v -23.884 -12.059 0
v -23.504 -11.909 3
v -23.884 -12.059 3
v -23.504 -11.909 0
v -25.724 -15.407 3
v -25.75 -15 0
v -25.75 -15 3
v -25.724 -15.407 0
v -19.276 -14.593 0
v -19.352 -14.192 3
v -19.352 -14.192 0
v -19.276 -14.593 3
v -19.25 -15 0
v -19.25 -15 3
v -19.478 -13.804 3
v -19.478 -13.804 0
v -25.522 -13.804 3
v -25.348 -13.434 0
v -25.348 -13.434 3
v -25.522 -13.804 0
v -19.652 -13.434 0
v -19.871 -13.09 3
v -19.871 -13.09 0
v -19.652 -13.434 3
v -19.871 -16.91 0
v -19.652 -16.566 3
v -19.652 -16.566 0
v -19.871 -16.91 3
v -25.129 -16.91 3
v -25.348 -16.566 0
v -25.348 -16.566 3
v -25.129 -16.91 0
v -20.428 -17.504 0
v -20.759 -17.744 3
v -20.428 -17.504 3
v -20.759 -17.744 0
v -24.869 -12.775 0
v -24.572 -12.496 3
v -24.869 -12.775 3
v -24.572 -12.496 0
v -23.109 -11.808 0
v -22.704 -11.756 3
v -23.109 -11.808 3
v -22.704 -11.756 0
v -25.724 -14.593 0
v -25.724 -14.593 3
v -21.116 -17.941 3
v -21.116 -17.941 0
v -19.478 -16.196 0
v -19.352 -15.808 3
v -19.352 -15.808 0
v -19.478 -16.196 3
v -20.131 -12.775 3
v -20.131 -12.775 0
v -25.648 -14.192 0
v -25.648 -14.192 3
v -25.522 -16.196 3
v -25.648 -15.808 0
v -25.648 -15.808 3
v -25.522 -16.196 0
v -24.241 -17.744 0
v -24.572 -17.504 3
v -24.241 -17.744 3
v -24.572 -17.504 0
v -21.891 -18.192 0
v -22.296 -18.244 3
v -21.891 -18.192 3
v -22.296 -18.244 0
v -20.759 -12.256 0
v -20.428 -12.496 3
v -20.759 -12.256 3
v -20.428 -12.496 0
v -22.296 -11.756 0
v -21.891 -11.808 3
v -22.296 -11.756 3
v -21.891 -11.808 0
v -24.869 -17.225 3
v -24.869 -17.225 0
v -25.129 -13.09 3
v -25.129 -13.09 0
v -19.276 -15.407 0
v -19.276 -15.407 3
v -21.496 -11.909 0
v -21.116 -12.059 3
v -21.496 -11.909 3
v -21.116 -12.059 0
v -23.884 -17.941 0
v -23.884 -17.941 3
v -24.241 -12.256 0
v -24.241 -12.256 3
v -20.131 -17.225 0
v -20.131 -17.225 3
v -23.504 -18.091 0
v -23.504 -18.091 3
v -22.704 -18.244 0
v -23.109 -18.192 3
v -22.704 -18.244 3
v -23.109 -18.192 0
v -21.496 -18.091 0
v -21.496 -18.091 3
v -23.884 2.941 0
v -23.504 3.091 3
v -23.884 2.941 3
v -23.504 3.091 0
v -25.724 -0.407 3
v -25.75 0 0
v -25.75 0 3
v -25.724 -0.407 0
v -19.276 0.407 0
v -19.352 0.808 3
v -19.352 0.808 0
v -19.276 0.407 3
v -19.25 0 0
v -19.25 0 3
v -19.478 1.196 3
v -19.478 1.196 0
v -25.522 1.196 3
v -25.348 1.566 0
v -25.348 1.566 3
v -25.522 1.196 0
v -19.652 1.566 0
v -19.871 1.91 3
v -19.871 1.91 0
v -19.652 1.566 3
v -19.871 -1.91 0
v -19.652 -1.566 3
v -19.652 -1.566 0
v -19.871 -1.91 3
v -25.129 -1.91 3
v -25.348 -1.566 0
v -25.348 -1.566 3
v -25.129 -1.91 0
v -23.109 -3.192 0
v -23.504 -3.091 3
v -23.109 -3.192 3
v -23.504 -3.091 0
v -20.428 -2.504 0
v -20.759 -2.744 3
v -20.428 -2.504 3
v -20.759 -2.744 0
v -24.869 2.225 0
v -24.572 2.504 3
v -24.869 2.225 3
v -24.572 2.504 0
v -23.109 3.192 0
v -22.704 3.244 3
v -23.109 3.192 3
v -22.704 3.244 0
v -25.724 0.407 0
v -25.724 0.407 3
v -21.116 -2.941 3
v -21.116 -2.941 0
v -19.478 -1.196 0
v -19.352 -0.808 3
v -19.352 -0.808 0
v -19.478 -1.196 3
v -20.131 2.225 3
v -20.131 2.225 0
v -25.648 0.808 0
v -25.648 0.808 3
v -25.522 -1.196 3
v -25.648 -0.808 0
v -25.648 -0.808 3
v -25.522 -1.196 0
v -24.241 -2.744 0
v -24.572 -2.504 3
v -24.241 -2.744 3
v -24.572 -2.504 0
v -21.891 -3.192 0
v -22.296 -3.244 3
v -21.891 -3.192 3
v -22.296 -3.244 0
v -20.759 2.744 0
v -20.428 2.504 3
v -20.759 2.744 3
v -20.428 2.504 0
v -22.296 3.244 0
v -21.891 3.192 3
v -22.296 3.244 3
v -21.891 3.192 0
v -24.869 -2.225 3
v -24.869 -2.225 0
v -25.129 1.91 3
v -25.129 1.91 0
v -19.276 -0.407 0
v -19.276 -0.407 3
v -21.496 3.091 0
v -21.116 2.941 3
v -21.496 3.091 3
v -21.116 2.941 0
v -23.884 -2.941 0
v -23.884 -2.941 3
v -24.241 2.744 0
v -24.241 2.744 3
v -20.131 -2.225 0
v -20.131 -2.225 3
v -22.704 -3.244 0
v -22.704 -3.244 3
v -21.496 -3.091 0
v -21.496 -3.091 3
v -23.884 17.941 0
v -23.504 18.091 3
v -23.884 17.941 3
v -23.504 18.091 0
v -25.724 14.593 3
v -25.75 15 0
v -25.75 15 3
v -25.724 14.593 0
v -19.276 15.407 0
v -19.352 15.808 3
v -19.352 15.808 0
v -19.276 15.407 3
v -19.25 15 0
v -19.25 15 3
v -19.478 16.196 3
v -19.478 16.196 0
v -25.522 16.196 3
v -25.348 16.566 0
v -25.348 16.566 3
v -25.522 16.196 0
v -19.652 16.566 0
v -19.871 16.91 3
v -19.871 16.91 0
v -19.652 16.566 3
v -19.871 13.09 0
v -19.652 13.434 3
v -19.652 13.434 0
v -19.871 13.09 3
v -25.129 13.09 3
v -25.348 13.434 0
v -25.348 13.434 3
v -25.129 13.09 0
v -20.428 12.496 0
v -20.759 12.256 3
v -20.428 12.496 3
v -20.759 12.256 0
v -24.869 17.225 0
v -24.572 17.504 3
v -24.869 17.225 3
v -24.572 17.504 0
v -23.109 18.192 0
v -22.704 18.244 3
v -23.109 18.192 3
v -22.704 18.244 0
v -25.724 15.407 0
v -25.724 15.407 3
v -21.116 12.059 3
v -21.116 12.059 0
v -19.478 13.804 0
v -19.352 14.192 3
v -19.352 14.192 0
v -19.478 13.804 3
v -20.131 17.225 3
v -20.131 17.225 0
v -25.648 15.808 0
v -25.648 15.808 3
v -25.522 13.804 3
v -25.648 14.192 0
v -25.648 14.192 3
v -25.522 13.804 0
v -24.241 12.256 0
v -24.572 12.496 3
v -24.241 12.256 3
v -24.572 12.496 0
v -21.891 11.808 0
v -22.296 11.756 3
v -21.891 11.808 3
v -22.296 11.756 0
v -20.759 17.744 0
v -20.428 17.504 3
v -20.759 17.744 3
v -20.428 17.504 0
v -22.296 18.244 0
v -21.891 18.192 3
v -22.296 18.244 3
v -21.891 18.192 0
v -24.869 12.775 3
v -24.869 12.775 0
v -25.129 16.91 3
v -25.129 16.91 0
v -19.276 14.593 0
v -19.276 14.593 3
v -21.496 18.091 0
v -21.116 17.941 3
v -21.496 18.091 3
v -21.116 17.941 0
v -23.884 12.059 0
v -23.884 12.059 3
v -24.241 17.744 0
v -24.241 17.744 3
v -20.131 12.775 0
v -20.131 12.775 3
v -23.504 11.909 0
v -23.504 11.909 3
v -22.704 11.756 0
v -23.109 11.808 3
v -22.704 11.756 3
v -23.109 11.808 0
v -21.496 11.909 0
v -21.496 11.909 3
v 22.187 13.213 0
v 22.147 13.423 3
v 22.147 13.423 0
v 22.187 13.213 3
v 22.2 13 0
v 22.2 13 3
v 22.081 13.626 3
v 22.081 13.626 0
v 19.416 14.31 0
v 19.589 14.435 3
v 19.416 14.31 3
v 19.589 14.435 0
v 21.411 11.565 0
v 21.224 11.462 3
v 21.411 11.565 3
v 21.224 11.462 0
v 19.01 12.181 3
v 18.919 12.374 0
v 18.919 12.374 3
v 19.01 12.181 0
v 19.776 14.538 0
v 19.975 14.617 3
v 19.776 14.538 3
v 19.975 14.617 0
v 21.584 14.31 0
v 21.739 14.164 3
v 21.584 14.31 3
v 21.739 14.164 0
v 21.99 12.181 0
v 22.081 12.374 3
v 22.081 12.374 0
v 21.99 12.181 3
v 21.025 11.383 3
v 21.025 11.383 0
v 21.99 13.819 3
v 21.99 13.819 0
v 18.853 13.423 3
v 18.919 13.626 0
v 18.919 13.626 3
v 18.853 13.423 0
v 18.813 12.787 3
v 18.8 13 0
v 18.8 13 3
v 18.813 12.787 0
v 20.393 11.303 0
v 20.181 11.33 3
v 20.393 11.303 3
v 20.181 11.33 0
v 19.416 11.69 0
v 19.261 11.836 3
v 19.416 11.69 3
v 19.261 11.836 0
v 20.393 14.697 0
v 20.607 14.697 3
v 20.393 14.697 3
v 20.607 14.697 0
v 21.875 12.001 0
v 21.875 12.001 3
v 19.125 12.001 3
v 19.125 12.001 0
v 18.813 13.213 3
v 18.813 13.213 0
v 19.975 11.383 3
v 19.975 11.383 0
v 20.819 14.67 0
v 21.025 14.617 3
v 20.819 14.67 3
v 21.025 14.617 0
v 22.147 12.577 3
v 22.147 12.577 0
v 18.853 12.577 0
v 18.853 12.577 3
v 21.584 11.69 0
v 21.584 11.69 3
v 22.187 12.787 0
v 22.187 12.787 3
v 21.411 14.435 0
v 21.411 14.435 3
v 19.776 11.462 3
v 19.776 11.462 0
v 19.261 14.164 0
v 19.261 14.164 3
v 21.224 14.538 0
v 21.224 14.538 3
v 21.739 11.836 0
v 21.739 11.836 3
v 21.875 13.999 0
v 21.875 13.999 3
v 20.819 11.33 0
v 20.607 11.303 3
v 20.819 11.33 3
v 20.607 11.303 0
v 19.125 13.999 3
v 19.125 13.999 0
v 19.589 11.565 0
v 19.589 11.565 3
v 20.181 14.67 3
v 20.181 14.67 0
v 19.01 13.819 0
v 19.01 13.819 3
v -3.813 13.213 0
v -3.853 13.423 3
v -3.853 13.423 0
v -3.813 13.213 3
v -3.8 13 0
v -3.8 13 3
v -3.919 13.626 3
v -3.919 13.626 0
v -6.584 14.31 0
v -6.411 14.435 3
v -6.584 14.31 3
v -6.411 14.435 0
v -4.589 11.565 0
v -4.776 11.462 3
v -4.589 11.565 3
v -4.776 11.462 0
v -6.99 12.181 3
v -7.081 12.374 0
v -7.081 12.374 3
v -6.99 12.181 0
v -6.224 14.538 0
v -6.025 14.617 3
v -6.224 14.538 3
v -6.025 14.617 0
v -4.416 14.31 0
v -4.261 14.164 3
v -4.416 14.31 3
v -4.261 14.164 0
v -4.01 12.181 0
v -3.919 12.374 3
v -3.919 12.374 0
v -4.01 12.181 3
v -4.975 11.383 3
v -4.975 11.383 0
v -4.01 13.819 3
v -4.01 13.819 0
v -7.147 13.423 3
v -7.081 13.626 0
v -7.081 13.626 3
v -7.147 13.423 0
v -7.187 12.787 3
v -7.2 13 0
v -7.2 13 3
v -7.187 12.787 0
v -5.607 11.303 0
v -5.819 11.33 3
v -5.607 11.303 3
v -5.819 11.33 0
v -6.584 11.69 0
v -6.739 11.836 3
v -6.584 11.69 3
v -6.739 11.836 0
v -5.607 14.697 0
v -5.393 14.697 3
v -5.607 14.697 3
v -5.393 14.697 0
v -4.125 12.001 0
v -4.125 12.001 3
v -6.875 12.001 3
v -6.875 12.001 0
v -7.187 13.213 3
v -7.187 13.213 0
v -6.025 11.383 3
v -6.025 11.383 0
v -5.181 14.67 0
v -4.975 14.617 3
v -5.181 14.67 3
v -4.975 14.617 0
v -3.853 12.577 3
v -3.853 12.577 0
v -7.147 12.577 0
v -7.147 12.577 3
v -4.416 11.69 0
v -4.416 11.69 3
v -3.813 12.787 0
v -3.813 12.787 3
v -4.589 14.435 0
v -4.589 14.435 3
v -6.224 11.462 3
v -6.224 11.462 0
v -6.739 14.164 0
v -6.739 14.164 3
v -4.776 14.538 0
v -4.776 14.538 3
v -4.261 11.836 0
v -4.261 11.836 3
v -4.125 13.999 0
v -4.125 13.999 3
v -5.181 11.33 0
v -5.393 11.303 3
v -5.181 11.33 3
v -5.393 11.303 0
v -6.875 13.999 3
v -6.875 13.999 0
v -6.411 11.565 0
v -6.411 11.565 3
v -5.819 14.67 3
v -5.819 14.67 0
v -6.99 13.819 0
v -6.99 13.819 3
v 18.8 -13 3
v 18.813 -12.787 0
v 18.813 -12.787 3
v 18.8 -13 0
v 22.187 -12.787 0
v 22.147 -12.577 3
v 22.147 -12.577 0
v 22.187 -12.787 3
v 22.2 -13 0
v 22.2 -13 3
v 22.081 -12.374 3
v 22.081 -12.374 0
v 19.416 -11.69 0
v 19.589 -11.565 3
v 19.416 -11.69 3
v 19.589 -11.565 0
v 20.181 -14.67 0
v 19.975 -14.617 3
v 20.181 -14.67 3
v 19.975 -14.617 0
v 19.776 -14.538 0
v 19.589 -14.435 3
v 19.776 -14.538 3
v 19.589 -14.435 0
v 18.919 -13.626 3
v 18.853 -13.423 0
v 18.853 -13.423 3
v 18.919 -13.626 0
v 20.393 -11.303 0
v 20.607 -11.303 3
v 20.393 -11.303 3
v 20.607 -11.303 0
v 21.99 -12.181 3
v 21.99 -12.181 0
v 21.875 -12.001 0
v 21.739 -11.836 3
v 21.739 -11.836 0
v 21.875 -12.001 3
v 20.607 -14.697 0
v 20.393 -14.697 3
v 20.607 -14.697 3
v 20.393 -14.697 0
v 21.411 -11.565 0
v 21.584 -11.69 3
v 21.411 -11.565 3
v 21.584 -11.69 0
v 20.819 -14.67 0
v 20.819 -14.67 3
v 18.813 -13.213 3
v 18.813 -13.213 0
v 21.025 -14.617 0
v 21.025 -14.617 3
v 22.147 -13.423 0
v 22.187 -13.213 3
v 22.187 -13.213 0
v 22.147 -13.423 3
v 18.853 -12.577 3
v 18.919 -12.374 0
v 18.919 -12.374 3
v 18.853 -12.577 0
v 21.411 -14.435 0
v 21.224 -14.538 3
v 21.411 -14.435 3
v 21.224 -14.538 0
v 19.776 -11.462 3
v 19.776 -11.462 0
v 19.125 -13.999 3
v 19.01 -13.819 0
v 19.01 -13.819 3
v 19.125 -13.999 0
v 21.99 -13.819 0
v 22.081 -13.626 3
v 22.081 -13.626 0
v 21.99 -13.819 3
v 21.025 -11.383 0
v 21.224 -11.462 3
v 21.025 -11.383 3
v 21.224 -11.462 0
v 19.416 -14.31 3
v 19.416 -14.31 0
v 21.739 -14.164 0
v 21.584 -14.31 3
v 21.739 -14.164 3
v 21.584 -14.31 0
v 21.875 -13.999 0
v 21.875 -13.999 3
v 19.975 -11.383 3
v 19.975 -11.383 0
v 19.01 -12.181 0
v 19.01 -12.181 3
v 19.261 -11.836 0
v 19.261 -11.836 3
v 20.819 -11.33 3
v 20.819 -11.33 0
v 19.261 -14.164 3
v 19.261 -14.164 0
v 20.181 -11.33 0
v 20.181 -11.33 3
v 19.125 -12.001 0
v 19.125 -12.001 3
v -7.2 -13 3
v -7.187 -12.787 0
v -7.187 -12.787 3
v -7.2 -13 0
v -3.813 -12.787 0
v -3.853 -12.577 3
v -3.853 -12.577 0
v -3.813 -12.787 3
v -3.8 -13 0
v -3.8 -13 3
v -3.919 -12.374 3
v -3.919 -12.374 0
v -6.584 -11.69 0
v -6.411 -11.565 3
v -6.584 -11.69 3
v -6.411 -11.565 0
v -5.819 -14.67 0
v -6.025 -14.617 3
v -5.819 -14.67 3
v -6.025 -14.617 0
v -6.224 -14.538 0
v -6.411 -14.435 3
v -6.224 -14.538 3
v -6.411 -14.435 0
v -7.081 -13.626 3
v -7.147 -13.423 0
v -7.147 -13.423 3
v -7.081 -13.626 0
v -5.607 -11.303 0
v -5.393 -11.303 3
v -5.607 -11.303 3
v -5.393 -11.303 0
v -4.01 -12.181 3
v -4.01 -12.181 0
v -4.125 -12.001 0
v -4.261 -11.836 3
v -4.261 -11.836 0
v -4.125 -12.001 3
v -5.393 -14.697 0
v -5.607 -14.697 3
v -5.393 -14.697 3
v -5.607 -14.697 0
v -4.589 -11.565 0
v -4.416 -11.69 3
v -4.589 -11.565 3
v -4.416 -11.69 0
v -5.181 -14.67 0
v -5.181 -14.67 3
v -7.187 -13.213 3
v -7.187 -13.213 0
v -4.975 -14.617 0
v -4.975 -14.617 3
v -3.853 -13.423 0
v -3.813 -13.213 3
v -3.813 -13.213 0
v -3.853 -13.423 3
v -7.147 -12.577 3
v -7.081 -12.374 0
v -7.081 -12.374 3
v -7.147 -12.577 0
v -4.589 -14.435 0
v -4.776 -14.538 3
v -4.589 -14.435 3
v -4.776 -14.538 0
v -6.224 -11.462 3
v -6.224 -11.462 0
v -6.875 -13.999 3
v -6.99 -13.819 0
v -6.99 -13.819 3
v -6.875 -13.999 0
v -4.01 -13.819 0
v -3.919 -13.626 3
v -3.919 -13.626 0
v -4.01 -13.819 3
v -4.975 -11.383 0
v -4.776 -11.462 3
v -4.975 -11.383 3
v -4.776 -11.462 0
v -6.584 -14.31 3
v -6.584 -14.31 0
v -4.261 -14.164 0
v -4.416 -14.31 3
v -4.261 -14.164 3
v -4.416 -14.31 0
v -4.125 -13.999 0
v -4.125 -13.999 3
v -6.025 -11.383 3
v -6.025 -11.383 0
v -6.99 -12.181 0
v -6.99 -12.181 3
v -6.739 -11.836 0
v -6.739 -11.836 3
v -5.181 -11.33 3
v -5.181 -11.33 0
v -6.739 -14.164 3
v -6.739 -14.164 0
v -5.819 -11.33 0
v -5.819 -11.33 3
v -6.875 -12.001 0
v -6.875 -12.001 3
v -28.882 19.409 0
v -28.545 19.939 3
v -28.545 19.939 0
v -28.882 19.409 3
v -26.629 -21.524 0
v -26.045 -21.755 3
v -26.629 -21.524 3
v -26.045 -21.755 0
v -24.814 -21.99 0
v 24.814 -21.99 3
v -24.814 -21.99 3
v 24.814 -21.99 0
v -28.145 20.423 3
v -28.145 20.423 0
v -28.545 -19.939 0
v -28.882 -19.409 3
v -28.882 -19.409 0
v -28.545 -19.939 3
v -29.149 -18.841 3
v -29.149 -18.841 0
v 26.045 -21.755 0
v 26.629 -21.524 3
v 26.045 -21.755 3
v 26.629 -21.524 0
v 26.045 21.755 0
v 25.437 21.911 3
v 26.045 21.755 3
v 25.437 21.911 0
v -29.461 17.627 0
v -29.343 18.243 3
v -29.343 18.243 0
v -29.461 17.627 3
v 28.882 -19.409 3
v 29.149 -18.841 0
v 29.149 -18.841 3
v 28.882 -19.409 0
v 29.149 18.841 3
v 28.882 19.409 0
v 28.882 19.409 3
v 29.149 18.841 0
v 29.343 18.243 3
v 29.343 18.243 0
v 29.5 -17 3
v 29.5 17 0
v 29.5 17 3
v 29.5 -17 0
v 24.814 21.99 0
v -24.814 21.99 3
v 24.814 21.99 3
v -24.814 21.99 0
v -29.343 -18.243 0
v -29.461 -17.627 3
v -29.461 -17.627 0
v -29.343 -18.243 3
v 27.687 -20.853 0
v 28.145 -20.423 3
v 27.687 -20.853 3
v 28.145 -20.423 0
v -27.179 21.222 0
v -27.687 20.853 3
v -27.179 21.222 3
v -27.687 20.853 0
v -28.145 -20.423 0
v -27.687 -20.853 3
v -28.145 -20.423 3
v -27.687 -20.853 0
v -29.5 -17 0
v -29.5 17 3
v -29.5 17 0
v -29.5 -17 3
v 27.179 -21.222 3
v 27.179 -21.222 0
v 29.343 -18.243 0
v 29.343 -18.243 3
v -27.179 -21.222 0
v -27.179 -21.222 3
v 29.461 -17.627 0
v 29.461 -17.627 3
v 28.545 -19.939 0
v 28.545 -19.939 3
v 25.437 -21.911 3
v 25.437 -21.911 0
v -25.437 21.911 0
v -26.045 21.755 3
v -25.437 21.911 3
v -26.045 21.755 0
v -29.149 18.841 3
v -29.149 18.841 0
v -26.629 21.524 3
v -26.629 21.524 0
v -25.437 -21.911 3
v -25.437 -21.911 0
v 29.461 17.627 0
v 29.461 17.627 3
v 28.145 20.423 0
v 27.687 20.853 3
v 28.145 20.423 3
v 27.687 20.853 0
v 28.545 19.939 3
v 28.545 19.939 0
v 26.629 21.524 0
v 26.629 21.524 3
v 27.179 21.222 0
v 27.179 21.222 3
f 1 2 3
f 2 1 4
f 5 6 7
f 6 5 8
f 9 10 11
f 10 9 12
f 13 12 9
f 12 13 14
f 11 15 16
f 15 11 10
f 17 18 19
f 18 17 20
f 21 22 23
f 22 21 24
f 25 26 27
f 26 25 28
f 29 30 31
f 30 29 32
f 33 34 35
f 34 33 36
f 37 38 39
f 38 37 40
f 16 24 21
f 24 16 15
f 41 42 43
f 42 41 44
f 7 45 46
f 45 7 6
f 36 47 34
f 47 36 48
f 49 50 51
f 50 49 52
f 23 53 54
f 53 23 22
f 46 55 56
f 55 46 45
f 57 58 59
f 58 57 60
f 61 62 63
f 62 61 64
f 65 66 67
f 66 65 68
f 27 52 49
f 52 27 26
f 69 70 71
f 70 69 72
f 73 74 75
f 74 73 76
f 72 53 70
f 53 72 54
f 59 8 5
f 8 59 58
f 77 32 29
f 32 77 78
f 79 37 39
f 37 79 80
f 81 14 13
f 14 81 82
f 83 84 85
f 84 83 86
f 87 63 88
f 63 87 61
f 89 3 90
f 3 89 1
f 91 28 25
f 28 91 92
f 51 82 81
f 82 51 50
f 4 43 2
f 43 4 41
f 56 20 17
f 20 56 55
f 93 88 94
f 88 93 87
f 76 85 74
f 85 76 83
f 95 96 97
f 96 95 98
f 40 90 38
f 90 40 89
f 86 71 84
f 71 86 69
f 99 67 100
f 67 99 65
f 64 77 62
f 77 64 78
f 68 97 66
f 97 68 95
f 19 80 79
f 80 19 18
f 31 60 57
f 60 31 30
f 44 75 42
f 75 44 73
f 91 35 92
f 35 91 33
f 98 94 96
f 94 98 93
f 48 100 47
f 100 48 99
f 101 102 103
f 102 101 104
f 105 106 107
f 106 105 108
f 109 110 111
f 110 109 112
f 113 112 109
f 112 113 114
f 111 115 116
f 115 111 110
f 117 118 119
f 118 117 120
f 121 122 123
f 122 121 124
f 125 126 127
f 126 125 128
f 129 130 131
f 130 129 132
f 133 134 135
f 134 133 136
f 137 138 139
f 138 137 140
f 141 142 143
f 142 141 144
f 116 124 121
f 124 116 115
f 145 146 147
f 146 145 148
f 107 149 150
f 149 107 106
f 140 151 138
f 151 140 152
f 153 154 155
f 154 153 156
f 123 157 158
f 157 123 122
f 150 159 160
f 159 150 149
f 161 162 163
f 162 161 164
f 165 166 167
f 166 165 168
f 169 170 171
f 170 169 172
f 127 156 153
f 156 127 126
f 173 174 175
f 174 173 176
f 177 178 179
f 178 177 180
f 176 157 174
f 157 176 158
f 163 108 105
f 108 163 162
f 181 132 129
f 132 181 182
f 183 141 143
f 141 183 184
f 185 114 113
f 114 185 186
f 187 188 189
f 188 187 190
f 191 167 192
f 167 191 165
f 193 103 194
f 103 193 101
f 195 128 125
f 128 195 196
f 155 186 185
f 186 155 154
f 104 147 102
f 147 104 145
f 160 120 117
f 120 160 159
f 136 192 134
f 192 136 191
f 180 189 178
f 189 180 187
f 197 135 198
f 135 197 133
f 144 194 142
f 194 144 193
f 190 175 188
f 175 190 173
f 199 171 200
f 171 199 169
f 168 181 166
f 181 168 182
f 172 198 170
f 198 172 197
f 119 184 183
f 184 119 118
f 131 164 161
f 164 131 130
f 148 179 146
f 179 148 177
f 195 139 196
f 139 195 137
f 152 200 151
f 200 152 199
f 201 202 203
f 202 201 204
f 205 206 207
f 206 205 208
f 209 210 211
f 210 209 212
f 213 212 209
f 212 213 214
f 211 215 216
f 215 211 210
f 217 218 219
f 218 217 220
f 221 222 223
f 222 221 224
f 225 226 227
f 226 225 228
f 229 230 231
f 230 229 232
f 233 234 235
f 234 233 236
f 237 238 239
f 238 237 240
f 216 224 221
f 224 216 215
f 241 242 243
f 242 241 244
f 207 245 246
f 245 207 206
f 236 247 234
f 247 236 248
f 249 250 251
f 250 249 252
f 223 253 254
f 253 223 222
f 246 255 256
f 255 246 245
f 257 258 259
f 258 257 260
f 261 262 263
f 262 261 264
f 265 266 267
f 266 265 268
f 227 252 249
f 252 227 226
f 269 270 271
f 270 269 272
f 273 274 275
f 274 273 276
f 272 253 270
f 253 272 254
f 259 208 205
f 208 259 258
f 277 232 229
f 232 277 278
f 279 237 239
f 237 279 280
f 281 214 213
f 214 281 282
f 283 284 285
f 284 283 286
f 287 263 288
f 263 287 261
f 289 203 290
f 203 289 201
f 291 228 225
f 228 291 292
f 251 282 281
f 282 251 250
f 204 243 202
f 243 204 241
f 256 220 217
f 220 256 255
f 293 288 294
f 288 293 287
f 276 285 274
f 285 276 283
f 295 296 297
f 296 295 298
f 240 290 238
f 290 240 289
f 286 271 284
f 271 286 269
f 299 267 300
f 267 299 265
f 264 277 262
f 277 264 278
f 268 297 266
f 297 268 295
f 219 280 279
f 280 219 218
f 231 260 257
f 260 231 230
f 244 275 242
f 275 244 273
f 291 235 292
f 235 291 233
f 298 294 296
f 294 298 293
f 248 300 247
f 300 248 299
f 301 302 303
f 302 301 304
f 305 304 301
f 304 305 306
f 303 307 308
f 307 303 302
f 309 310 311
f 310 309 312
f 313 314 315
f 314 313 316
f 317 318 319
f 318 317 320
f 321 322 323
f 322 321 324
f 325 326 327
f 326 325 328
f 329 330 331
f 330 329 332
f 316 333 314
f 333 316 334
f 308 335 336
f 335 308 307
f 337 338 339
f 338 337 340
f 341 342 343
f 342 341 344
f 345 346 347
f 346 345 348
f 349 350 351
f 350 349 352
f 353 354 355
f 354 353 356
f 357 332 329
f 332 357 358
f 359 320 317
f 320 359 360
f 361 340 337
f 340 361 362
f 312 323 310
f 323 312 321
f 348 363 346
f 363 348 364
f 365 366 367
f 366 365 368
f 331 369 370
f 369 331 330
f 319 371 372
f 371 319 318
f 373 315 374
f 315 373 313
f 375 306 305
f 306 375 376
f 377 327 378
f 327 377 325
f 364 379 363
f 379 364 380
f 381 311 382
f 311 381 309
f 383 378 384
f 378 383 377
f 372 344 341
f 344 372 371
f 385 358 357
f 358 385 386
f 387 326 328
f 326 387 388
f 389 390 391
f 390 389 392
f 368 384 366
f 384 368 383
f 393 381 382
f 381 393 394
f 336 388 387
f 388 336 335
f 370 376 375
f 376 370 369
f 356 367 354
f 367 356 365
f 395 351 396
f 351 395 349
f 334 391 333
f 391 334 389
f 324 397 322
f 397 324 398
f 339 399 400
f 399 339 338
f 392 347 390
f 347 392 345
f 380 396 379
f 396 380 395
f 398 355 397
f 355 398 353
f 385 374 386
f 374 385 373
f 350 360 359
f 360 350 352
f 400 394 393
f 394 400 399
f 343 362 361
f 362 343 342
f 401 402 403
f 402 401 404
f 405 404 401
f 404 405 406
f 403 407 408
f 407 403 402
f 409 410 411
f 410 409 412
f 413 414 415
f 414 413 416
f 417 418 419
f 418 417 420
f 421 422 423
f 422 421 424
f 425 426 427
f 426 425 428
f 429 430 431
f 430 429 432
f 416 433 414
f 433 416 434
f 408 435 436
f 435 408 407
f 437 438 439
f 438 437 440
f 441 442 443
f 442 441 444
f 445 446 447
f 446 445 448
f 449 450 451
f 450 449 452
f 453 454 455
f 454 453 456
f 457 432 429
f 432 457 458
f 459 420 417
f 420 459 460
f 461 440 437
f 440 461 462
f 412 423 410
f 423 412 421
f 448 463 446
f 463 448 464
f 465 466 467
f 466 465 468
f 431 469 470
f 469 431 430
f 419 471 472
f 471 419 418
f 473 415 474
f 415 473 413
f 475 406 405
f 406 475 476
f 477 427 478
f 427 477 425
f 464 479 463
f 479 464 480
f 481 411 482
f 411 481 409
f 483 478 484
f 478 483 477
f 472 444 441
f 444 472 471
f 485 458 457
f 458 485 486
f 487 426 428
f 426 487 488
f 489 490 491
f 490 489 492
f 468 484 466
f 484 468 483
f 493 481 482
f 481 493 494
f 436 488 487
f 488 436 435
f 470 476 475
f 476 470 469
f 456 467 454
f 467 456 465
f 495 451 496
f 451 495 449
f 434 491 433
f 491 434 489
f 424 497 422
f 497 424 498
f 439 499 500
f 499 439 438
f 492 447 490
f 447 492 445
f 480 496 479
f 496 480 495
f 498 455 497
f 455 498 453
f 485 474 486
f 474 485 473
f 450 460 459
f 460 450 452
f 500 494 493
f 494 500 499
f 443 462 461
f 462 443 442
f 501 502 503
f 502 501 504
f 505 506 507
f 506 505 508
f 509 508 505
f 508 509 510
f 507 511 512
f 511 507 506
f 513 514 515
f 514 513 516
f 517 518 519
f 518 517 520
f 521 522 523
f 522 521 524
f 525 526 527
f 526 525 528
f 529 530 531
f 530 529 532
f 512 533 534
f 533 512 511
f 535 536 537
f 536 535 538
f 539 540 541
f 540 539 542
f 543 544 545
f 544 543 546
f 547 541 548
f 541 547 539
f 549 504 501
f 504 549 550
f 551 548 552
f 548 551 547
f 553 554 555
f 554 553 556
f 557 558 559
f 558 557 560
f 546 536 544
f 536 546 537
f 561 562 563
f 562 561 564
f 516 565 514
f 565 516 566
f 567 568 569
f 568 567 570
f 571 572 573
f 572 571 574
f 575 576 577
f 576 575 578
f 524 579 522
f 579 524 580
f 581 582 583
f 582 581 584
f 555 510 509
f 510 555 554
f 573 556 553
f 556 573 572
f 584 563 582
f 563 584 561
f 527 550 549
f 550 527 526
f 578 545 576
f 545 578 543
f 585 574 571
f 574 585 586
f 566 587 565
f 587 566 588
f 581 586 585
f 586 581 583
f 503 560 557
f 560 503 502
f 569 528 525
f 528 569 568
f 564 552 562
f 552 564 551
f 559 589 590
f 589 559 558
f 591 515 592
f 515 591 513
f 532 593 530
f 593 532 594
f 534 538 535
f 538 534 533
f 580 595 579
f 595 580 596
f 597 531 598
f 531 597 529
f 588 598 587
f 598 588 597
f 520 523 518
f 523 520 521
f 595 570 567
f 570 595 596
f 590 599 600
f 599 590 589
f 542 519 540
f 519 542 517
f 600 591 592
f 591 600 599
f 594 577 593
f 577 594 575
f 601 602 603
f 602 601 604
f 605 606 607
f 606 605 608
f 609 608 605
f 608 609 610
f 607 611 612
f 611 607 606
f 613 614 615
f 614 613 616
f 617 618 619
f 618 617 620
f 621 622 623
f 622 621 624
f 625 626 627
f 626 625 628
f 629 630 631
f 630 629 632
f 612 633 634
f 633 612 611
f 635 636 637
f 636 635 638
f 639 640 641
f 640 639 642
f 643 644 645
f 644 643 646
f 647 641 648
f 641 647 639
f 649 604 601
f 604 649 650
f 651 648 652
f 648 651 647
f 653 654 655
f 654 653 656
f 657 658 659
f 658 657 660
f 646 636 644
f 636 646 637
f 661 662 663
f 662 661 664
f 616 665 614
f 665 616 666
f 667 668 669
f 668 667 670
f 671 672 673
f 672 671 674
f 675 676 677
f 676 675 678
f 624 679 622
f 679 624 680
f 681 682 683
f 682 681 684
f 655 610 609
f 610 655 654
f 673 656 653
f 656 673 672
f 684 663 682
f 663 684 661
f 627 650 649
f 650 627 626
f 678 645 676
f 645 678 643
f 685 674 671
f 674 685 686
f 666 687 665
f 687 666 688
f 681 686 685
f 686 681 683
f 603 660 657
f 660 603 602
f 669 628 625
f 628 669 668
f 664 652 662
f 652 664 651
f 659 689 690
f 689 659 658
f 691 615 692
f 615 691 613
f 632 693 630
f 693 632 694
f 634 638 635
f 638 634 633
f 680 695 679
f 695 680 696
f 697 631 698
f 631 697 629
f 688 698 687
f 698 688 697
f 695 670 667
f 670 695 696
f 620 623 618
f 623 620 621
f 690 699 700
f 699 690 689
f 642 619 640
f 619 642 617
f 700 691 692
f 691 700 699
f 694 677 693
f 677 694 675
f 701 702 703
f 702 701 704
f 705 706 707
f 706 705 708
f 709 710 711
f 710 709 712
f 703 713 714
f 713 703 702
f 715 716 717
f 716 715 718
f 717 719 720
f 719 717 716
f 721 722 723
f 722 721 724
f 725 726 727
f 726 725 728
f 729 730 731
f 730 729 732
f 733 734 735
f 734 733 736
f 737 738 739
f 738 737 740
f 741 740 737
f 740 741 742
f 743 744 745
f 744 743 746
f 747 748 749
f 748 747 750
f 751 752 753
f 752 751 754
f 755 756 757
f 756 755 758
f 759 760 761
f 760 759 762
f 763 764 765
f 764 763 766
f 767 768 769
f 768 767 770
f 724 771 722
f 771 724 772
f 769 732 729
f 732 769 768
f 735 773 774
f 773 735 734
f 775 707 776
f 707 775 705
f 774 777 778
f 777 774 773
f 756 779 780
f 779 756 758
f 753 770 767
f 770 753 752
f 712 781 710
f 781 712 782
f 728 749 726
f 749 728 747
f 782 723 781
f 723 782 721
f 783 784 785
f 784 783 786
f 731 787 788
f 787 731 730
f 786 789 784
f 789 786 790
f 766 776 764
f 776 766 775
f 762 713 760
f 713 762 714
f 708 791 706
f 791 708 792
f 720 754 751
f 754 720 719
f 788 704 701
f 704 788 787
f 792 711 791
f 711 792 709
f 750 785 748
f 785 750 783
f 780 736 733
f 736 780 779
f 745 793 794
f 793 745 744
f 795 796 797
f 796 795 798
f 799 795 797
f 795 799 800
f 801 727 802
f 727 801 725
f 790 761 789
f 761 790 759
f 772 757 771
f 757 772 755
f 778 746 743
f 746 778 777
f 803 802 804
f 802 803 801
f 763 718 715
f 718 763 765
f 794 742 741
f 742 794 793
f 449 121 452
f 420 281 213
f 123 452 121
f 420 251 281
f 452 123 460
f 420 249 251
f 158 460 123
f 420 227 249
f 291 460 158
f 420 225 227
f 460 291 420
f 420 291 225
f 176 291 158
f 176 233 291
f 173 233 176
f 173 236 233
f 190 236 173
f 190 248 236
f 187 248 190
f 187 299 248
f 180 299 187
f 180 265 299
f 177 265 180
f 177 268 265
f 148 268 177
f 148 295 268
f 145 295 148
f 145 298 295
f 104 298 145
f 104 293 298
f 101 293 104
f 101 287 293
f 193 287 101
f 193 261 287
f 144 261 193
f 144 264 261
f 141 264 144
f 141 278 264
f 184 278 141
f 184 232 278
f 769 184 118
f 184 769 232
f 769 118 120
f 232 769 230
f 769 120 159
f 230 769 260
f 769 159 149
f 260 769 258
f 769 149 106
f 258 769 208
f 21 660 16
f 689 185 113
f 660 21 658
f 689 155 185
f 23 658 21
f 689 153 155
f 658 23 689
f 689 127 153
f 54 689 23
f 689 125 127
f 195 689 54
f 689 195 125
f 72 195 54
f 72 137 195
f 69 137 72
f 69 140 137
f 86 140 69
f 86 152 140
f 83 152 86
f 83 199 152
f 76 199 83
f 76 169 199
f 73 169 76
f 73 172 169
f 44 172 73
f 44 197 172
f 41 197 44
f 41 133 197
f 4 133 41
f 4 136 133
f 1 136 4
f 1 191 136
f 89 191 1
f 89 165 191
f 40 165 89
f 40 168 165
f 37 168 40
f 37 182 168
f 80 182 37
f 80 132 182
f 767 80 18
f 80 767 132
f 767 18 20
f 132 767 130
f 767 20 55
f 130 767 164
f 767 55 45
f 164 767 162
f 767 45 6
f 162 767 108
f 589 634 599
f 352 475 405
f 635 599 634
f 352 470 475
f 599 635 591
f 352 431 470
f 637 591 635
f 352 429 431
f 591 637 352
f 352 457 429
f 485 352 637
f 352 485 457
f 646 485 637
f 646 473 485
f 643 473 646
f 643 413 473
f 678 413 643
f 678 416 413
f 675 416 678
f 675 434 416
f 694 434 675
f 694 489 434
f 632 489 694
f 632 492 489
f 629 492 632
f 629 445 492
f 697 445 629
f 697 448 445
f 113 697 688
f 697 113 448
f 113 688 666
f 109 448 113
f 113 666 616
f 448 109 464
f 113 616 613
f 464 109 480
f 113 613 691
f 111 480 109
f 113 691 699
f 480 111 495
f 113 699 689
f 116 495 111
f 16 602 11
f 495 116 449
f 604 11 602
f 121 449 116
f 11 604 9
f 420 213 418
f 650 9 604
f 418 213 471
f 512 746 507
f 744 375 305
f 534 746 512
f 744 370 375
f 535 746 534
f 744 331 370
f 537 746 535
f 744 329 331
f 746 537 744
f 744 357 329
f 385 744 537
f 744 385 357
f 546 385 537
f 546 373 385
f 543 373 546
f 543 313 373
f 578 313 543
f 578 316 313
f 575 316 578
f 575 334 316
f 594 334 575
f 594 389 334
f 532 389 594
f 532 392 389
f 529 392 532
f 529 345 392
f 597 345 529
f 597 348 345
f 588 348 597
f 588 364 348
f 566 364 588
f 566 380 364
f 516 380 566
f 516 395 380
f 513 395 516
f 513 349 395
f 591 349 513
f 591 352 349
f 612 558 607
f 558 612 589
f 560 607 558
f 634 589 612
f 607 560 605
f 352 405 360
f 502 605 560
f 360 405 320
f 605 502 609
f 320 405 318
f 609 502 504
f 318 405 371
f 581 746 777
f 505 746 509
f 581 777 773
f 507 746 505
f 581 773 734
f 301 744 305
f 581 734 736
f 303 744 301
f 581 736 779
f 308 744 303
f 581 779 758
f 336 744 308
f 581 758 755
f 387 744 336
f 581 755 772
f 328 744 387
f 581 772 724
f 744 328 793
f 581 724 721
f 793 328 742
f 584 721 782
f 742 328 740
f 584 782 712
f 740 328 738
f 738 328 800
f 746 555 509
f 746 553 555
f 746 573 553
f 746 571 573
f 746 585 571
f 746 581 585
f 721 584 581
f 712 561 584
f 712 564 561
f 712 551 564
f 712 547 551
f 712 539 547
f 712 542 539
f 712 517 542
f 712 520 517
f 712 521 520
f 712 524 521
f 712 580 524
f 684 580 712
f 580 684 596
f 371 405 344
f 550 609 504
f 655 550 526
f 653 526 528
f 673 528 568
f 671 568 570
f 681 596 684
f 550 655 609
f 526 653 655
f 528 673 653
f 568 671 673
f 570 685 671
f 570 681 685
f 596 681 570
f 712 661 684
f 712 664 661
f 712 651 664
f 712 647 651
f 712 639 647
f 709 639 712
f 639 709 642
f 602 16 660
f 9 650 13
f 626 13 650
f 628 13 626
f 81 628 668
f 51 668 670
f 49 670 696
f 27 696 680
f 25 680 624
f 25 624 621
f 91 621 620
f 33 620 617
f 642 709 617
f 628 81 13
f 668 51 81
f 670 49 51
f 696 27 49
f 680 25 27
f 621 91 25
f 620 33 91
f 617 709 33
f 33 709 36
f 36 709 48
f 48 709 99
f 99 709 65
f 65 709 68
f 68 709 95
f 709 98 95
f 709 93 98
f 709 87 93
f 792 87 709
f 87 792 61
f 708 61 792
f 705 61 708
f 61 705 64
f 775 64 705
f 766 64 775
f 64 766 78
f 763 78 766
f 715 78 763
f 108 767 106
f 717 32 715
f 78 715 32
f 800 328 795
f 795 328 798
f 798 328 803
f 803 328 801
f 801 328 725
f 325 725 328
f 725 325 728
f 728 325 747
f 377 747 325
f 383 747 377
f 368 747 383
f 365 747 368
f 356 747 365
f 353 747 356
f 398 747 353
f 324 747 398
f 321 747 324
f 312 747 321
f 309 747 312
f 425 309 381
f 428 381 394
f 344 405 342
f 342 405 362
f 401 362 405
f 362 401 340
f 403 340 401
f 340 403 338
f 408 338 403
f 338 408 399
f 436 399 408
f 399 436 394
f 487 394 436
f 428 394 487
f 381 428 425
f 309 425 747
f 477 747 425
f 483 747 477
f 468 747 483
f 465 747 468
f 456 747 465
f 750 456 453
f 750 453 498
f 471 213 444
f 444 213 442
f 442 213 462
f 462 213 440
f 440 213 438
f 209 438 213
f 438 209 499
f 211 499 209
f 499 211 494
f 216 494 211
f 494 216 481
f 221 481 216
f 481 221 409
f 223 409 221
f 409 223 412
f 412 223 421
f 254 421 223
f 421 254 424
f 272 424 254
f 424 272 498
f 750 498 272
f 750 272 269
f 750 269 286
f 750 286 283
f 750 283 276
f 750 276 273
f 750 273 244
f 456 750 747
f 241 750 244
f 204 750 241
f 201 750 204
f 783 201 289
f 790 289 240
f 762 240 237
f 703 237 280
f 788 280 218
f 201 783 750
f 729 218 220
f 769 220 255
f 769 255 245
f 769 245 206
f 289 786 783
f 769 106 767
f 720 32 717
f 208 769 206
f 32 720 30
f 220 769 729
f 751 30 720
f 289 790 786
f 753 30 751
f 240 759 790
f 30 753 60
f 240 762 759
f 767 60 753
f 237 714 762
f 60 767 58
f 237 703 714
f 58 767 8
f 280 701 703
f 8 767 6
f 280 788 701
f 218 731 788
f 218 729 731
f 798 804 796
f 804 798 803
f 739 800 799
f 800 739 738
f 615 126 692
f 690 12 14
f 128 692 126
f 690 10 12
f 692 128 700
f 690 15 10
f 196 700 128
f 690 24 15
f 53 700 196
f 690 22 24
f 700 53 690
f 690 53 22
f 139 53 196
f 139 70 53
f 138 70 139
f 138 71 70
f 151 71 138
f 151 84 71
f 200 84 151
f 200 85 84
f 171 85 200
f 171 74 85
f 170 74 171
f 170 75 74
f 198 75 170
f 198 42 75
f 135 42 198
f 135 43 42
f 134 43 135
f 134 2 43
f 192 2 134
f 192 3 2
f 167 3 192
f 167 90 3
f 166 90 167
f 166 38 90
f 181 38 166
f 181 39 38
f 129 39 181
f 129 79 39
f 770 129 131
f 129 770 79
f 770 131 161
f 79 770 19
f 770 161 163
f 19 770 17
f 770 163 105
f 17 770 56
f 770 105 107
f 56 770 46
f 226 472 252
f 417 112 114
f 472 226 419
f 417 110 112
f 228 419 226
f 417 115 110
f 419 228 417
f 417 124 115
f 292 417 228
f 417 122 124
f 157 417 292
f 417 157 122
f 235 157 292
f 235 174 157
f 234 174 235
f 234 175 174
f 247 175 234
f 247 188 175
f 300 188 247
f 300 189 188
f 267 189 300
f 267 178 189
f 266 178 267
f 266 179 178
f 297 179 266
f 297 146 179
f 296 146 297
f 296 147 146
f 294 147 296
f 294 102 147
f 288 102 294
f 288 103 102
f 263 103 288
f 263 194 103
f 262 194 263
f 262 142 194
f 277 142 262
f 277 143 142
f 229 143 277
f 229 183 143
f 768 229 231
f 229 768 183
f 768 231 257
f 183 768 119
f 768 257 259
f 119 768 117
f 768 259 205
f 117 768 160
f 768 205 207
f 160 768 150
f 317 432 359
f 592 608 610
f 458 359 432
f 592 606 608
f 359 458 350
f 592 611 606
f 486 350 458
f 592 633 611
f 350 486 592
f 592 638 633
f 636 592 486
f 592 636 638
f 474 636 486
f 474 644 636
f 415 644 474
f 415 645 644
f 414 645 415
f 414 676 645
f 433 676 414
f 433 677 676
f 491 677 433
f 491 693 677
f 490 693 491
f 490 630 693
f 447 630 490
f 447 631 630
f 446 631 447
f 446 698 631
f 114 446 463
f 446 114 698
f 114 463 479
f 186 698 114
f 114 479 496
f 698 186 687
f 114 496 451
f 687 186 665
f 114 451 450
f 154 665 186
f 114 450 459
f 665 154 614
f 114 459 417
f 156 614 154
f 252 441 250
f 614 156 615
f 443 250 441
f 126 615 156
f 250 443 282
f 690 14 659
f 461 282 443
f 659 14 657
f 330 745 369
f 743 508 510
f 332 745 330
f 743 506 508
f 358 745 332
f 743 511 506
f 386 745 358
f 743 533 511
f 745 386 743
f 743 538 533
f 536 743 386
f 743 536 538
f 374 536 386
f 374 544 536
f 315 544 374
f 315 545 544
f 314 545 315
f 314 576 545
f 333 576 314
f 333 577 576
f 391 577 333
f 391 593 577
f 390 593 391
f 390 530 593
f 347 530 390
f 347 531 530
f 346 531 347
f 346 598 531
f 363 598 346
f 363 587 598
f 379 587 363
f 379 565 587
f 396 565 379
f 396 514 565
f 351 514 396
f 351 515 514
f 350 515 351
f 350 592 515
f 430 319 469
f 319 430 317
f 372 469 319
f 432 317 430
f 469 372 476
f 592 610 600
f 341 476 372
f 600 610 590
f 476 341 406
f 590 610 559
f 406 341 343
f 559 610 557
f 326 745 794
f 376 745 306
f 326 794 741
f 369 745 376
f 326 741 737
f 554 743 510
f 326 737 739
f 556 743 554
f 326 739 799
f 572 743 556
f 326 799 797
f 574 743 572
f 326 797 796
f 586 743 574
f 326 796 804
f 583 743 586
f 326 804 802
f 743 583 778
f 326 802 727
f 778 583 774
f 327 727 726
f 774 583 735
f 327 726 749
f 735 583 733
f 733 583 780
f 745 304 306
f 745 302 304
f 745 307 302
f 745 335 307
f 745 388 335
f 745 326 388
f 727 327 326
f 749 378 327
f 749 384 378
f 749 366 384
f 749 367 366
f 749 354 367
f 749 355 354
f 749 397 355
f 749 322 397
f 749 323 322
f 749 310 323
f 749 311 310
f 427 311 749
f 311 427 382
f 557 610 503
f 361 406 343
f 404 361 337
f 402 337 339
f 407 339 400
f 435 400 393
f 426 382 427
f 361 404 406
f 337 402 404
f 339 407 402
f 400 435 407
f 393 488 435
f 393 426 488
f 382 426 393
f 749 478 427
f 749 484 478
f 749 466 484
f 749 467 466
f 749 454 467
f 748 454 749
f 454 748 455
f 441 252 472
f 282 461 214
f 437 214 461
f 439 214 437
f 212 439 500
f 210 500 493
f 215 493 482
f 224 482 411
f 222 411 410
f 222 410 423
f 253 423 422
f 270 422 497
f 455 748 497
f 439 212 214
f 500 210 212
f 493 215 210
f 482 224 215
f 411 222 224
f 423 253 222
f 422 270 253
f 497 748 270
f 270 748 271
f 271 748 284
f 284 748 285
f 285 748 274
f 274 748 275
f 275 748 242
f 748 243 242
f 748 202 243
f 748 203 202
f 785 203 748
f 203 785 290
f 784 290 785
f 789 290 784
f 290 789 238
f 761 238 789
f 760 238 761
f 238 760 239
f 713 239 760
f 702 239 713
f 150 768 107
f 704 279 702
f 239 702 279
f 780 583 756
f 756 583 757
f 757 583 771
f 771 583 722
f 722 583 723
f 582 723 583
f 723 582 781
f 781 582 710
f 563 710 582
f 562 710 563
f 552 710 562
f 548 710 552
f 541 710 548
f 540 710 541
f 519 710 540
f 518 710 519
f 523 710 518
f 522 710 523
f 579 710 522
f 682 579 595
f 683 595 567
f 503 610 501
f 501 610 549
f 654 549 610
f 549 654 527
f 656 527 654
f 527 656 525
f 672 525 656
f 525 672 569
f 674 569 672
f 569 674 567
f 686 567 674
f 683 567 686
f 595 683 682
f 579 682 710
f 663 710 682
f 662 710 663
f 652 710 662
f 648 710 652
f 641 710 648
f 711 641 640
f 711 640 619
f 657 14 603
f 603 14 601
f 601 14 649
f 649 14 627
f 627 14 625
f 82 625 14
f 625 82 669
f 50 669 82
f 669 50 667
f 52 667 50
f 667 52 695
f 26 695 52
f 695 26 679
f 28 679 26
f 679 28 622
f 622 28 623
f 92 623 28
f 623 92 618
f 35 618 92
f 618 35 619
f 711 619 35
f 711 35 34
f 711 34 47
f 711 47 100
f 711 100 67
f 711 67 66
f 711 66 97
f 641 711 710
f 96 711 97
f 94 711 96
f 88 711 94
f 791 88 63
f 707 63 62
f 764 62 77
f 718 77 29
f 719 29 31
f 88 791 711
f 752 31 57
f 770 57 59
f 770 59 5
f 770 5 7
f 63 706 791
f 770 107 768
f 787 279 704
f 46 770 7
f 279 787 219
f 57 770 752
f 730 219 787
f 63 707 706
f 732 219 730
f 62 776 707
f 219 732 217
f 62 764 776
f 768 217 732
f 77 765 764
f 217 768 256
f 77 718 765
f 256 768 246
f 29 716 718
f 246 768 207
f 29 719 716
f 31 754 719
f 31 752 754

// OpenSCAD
$fn = 50;


difference() {
	union() {
		translate(v = [0, 0, 0]) {
			rotate(a = [0, 0, 0]) {
				hull() {
					translate(v = [-24.5000000000, 17.0000000000, 0]) {
						rotate(a = [0, 0, 0]) {
							translate(v = [0, 0, 0]) {
								rotate(a = [0, 0, 0]) {
									cylinder(h = 3, r = 5);
								}
							}
						}
					}
					translate(v = [24.5000000000, 17.0000000000, 0]) {
						rotate(a = [0, 0, 0]) {
							translate(v = [0, 0, 0]) {
								rotate(a = [0, 0, 0]) {
									cylinder(h = 3, r = 5);
								}
							}
						}
					}
					translate(v = [-24.5000000000, -17.0000000000, 0]) {
						rotate(a = [0, 0, 0]) {
							translate(v = [0, 0, 0]) {
								rotate(a = [0, 0, 0]) {
									cylinder(h = 3, r = 5);
								}
							}
						}
					}
					translate(v = [24.5000000000, -17.0000000000, 0]) {
						rotate(a = [0, 0, 0]) {
							translate(v = [0, 0, 0]) {
								rotate(a = [0, 0, 0]) {
									cylinder(h = 3, r = 5);
								}
							}
						}
					}
				}
			}
		}
	}
	union() {
		translate(v = [-22.5000000000, -15.0000000000, -125.0000000000]) {
			rotate(a = [0, 0, 0]) {
				cylinder(h = 250, r = 3.2500000000);
			}
		}
		translate(v = [-22.5000000000, 0.0000000000, -125.0000000000]) {
			rotate(a = [0, 0, 0]) {
				cylinder(h = 250, r = 3.2500000000);
			}
		}
		translate(v = [-22.5000000000, 15.0000000000, -125.0000000000]) {
			rotate(a = [0, 0, 0]) {
				cylinder(h = 250, r = 3.2500000000);
			}
		}
		translate(v = [20.5000000000, 13.0000000000, -125.0000000000]) {
			rotate(a = [0, 0, 0]) {
				cylinder(h = 250, r = 1.7000000000);
			}
		}
		translate(v = [-5.5000000000, 13.0000000000, -125.0000000000]) {
			rotate(a = [0, 0, 0]) {
				cylinder(h = 250, r = 1.7000000000);
			}
		}
		translate(v = [20.5000000000, -13.0000000000, -125.0000000000]) {
			rotate(a = [0, 0, 0]) {
				cylinder(h = 250, r = 1.7000000000);
			}
		}
		translate(v = [-5.5000000000, -13.0000000000, -125.0000000000]) {
			rotate(a = [0, 0, 0]) {
				cylinder(h = 250, r = 1.7000000000);
			}
		}
	}
}
